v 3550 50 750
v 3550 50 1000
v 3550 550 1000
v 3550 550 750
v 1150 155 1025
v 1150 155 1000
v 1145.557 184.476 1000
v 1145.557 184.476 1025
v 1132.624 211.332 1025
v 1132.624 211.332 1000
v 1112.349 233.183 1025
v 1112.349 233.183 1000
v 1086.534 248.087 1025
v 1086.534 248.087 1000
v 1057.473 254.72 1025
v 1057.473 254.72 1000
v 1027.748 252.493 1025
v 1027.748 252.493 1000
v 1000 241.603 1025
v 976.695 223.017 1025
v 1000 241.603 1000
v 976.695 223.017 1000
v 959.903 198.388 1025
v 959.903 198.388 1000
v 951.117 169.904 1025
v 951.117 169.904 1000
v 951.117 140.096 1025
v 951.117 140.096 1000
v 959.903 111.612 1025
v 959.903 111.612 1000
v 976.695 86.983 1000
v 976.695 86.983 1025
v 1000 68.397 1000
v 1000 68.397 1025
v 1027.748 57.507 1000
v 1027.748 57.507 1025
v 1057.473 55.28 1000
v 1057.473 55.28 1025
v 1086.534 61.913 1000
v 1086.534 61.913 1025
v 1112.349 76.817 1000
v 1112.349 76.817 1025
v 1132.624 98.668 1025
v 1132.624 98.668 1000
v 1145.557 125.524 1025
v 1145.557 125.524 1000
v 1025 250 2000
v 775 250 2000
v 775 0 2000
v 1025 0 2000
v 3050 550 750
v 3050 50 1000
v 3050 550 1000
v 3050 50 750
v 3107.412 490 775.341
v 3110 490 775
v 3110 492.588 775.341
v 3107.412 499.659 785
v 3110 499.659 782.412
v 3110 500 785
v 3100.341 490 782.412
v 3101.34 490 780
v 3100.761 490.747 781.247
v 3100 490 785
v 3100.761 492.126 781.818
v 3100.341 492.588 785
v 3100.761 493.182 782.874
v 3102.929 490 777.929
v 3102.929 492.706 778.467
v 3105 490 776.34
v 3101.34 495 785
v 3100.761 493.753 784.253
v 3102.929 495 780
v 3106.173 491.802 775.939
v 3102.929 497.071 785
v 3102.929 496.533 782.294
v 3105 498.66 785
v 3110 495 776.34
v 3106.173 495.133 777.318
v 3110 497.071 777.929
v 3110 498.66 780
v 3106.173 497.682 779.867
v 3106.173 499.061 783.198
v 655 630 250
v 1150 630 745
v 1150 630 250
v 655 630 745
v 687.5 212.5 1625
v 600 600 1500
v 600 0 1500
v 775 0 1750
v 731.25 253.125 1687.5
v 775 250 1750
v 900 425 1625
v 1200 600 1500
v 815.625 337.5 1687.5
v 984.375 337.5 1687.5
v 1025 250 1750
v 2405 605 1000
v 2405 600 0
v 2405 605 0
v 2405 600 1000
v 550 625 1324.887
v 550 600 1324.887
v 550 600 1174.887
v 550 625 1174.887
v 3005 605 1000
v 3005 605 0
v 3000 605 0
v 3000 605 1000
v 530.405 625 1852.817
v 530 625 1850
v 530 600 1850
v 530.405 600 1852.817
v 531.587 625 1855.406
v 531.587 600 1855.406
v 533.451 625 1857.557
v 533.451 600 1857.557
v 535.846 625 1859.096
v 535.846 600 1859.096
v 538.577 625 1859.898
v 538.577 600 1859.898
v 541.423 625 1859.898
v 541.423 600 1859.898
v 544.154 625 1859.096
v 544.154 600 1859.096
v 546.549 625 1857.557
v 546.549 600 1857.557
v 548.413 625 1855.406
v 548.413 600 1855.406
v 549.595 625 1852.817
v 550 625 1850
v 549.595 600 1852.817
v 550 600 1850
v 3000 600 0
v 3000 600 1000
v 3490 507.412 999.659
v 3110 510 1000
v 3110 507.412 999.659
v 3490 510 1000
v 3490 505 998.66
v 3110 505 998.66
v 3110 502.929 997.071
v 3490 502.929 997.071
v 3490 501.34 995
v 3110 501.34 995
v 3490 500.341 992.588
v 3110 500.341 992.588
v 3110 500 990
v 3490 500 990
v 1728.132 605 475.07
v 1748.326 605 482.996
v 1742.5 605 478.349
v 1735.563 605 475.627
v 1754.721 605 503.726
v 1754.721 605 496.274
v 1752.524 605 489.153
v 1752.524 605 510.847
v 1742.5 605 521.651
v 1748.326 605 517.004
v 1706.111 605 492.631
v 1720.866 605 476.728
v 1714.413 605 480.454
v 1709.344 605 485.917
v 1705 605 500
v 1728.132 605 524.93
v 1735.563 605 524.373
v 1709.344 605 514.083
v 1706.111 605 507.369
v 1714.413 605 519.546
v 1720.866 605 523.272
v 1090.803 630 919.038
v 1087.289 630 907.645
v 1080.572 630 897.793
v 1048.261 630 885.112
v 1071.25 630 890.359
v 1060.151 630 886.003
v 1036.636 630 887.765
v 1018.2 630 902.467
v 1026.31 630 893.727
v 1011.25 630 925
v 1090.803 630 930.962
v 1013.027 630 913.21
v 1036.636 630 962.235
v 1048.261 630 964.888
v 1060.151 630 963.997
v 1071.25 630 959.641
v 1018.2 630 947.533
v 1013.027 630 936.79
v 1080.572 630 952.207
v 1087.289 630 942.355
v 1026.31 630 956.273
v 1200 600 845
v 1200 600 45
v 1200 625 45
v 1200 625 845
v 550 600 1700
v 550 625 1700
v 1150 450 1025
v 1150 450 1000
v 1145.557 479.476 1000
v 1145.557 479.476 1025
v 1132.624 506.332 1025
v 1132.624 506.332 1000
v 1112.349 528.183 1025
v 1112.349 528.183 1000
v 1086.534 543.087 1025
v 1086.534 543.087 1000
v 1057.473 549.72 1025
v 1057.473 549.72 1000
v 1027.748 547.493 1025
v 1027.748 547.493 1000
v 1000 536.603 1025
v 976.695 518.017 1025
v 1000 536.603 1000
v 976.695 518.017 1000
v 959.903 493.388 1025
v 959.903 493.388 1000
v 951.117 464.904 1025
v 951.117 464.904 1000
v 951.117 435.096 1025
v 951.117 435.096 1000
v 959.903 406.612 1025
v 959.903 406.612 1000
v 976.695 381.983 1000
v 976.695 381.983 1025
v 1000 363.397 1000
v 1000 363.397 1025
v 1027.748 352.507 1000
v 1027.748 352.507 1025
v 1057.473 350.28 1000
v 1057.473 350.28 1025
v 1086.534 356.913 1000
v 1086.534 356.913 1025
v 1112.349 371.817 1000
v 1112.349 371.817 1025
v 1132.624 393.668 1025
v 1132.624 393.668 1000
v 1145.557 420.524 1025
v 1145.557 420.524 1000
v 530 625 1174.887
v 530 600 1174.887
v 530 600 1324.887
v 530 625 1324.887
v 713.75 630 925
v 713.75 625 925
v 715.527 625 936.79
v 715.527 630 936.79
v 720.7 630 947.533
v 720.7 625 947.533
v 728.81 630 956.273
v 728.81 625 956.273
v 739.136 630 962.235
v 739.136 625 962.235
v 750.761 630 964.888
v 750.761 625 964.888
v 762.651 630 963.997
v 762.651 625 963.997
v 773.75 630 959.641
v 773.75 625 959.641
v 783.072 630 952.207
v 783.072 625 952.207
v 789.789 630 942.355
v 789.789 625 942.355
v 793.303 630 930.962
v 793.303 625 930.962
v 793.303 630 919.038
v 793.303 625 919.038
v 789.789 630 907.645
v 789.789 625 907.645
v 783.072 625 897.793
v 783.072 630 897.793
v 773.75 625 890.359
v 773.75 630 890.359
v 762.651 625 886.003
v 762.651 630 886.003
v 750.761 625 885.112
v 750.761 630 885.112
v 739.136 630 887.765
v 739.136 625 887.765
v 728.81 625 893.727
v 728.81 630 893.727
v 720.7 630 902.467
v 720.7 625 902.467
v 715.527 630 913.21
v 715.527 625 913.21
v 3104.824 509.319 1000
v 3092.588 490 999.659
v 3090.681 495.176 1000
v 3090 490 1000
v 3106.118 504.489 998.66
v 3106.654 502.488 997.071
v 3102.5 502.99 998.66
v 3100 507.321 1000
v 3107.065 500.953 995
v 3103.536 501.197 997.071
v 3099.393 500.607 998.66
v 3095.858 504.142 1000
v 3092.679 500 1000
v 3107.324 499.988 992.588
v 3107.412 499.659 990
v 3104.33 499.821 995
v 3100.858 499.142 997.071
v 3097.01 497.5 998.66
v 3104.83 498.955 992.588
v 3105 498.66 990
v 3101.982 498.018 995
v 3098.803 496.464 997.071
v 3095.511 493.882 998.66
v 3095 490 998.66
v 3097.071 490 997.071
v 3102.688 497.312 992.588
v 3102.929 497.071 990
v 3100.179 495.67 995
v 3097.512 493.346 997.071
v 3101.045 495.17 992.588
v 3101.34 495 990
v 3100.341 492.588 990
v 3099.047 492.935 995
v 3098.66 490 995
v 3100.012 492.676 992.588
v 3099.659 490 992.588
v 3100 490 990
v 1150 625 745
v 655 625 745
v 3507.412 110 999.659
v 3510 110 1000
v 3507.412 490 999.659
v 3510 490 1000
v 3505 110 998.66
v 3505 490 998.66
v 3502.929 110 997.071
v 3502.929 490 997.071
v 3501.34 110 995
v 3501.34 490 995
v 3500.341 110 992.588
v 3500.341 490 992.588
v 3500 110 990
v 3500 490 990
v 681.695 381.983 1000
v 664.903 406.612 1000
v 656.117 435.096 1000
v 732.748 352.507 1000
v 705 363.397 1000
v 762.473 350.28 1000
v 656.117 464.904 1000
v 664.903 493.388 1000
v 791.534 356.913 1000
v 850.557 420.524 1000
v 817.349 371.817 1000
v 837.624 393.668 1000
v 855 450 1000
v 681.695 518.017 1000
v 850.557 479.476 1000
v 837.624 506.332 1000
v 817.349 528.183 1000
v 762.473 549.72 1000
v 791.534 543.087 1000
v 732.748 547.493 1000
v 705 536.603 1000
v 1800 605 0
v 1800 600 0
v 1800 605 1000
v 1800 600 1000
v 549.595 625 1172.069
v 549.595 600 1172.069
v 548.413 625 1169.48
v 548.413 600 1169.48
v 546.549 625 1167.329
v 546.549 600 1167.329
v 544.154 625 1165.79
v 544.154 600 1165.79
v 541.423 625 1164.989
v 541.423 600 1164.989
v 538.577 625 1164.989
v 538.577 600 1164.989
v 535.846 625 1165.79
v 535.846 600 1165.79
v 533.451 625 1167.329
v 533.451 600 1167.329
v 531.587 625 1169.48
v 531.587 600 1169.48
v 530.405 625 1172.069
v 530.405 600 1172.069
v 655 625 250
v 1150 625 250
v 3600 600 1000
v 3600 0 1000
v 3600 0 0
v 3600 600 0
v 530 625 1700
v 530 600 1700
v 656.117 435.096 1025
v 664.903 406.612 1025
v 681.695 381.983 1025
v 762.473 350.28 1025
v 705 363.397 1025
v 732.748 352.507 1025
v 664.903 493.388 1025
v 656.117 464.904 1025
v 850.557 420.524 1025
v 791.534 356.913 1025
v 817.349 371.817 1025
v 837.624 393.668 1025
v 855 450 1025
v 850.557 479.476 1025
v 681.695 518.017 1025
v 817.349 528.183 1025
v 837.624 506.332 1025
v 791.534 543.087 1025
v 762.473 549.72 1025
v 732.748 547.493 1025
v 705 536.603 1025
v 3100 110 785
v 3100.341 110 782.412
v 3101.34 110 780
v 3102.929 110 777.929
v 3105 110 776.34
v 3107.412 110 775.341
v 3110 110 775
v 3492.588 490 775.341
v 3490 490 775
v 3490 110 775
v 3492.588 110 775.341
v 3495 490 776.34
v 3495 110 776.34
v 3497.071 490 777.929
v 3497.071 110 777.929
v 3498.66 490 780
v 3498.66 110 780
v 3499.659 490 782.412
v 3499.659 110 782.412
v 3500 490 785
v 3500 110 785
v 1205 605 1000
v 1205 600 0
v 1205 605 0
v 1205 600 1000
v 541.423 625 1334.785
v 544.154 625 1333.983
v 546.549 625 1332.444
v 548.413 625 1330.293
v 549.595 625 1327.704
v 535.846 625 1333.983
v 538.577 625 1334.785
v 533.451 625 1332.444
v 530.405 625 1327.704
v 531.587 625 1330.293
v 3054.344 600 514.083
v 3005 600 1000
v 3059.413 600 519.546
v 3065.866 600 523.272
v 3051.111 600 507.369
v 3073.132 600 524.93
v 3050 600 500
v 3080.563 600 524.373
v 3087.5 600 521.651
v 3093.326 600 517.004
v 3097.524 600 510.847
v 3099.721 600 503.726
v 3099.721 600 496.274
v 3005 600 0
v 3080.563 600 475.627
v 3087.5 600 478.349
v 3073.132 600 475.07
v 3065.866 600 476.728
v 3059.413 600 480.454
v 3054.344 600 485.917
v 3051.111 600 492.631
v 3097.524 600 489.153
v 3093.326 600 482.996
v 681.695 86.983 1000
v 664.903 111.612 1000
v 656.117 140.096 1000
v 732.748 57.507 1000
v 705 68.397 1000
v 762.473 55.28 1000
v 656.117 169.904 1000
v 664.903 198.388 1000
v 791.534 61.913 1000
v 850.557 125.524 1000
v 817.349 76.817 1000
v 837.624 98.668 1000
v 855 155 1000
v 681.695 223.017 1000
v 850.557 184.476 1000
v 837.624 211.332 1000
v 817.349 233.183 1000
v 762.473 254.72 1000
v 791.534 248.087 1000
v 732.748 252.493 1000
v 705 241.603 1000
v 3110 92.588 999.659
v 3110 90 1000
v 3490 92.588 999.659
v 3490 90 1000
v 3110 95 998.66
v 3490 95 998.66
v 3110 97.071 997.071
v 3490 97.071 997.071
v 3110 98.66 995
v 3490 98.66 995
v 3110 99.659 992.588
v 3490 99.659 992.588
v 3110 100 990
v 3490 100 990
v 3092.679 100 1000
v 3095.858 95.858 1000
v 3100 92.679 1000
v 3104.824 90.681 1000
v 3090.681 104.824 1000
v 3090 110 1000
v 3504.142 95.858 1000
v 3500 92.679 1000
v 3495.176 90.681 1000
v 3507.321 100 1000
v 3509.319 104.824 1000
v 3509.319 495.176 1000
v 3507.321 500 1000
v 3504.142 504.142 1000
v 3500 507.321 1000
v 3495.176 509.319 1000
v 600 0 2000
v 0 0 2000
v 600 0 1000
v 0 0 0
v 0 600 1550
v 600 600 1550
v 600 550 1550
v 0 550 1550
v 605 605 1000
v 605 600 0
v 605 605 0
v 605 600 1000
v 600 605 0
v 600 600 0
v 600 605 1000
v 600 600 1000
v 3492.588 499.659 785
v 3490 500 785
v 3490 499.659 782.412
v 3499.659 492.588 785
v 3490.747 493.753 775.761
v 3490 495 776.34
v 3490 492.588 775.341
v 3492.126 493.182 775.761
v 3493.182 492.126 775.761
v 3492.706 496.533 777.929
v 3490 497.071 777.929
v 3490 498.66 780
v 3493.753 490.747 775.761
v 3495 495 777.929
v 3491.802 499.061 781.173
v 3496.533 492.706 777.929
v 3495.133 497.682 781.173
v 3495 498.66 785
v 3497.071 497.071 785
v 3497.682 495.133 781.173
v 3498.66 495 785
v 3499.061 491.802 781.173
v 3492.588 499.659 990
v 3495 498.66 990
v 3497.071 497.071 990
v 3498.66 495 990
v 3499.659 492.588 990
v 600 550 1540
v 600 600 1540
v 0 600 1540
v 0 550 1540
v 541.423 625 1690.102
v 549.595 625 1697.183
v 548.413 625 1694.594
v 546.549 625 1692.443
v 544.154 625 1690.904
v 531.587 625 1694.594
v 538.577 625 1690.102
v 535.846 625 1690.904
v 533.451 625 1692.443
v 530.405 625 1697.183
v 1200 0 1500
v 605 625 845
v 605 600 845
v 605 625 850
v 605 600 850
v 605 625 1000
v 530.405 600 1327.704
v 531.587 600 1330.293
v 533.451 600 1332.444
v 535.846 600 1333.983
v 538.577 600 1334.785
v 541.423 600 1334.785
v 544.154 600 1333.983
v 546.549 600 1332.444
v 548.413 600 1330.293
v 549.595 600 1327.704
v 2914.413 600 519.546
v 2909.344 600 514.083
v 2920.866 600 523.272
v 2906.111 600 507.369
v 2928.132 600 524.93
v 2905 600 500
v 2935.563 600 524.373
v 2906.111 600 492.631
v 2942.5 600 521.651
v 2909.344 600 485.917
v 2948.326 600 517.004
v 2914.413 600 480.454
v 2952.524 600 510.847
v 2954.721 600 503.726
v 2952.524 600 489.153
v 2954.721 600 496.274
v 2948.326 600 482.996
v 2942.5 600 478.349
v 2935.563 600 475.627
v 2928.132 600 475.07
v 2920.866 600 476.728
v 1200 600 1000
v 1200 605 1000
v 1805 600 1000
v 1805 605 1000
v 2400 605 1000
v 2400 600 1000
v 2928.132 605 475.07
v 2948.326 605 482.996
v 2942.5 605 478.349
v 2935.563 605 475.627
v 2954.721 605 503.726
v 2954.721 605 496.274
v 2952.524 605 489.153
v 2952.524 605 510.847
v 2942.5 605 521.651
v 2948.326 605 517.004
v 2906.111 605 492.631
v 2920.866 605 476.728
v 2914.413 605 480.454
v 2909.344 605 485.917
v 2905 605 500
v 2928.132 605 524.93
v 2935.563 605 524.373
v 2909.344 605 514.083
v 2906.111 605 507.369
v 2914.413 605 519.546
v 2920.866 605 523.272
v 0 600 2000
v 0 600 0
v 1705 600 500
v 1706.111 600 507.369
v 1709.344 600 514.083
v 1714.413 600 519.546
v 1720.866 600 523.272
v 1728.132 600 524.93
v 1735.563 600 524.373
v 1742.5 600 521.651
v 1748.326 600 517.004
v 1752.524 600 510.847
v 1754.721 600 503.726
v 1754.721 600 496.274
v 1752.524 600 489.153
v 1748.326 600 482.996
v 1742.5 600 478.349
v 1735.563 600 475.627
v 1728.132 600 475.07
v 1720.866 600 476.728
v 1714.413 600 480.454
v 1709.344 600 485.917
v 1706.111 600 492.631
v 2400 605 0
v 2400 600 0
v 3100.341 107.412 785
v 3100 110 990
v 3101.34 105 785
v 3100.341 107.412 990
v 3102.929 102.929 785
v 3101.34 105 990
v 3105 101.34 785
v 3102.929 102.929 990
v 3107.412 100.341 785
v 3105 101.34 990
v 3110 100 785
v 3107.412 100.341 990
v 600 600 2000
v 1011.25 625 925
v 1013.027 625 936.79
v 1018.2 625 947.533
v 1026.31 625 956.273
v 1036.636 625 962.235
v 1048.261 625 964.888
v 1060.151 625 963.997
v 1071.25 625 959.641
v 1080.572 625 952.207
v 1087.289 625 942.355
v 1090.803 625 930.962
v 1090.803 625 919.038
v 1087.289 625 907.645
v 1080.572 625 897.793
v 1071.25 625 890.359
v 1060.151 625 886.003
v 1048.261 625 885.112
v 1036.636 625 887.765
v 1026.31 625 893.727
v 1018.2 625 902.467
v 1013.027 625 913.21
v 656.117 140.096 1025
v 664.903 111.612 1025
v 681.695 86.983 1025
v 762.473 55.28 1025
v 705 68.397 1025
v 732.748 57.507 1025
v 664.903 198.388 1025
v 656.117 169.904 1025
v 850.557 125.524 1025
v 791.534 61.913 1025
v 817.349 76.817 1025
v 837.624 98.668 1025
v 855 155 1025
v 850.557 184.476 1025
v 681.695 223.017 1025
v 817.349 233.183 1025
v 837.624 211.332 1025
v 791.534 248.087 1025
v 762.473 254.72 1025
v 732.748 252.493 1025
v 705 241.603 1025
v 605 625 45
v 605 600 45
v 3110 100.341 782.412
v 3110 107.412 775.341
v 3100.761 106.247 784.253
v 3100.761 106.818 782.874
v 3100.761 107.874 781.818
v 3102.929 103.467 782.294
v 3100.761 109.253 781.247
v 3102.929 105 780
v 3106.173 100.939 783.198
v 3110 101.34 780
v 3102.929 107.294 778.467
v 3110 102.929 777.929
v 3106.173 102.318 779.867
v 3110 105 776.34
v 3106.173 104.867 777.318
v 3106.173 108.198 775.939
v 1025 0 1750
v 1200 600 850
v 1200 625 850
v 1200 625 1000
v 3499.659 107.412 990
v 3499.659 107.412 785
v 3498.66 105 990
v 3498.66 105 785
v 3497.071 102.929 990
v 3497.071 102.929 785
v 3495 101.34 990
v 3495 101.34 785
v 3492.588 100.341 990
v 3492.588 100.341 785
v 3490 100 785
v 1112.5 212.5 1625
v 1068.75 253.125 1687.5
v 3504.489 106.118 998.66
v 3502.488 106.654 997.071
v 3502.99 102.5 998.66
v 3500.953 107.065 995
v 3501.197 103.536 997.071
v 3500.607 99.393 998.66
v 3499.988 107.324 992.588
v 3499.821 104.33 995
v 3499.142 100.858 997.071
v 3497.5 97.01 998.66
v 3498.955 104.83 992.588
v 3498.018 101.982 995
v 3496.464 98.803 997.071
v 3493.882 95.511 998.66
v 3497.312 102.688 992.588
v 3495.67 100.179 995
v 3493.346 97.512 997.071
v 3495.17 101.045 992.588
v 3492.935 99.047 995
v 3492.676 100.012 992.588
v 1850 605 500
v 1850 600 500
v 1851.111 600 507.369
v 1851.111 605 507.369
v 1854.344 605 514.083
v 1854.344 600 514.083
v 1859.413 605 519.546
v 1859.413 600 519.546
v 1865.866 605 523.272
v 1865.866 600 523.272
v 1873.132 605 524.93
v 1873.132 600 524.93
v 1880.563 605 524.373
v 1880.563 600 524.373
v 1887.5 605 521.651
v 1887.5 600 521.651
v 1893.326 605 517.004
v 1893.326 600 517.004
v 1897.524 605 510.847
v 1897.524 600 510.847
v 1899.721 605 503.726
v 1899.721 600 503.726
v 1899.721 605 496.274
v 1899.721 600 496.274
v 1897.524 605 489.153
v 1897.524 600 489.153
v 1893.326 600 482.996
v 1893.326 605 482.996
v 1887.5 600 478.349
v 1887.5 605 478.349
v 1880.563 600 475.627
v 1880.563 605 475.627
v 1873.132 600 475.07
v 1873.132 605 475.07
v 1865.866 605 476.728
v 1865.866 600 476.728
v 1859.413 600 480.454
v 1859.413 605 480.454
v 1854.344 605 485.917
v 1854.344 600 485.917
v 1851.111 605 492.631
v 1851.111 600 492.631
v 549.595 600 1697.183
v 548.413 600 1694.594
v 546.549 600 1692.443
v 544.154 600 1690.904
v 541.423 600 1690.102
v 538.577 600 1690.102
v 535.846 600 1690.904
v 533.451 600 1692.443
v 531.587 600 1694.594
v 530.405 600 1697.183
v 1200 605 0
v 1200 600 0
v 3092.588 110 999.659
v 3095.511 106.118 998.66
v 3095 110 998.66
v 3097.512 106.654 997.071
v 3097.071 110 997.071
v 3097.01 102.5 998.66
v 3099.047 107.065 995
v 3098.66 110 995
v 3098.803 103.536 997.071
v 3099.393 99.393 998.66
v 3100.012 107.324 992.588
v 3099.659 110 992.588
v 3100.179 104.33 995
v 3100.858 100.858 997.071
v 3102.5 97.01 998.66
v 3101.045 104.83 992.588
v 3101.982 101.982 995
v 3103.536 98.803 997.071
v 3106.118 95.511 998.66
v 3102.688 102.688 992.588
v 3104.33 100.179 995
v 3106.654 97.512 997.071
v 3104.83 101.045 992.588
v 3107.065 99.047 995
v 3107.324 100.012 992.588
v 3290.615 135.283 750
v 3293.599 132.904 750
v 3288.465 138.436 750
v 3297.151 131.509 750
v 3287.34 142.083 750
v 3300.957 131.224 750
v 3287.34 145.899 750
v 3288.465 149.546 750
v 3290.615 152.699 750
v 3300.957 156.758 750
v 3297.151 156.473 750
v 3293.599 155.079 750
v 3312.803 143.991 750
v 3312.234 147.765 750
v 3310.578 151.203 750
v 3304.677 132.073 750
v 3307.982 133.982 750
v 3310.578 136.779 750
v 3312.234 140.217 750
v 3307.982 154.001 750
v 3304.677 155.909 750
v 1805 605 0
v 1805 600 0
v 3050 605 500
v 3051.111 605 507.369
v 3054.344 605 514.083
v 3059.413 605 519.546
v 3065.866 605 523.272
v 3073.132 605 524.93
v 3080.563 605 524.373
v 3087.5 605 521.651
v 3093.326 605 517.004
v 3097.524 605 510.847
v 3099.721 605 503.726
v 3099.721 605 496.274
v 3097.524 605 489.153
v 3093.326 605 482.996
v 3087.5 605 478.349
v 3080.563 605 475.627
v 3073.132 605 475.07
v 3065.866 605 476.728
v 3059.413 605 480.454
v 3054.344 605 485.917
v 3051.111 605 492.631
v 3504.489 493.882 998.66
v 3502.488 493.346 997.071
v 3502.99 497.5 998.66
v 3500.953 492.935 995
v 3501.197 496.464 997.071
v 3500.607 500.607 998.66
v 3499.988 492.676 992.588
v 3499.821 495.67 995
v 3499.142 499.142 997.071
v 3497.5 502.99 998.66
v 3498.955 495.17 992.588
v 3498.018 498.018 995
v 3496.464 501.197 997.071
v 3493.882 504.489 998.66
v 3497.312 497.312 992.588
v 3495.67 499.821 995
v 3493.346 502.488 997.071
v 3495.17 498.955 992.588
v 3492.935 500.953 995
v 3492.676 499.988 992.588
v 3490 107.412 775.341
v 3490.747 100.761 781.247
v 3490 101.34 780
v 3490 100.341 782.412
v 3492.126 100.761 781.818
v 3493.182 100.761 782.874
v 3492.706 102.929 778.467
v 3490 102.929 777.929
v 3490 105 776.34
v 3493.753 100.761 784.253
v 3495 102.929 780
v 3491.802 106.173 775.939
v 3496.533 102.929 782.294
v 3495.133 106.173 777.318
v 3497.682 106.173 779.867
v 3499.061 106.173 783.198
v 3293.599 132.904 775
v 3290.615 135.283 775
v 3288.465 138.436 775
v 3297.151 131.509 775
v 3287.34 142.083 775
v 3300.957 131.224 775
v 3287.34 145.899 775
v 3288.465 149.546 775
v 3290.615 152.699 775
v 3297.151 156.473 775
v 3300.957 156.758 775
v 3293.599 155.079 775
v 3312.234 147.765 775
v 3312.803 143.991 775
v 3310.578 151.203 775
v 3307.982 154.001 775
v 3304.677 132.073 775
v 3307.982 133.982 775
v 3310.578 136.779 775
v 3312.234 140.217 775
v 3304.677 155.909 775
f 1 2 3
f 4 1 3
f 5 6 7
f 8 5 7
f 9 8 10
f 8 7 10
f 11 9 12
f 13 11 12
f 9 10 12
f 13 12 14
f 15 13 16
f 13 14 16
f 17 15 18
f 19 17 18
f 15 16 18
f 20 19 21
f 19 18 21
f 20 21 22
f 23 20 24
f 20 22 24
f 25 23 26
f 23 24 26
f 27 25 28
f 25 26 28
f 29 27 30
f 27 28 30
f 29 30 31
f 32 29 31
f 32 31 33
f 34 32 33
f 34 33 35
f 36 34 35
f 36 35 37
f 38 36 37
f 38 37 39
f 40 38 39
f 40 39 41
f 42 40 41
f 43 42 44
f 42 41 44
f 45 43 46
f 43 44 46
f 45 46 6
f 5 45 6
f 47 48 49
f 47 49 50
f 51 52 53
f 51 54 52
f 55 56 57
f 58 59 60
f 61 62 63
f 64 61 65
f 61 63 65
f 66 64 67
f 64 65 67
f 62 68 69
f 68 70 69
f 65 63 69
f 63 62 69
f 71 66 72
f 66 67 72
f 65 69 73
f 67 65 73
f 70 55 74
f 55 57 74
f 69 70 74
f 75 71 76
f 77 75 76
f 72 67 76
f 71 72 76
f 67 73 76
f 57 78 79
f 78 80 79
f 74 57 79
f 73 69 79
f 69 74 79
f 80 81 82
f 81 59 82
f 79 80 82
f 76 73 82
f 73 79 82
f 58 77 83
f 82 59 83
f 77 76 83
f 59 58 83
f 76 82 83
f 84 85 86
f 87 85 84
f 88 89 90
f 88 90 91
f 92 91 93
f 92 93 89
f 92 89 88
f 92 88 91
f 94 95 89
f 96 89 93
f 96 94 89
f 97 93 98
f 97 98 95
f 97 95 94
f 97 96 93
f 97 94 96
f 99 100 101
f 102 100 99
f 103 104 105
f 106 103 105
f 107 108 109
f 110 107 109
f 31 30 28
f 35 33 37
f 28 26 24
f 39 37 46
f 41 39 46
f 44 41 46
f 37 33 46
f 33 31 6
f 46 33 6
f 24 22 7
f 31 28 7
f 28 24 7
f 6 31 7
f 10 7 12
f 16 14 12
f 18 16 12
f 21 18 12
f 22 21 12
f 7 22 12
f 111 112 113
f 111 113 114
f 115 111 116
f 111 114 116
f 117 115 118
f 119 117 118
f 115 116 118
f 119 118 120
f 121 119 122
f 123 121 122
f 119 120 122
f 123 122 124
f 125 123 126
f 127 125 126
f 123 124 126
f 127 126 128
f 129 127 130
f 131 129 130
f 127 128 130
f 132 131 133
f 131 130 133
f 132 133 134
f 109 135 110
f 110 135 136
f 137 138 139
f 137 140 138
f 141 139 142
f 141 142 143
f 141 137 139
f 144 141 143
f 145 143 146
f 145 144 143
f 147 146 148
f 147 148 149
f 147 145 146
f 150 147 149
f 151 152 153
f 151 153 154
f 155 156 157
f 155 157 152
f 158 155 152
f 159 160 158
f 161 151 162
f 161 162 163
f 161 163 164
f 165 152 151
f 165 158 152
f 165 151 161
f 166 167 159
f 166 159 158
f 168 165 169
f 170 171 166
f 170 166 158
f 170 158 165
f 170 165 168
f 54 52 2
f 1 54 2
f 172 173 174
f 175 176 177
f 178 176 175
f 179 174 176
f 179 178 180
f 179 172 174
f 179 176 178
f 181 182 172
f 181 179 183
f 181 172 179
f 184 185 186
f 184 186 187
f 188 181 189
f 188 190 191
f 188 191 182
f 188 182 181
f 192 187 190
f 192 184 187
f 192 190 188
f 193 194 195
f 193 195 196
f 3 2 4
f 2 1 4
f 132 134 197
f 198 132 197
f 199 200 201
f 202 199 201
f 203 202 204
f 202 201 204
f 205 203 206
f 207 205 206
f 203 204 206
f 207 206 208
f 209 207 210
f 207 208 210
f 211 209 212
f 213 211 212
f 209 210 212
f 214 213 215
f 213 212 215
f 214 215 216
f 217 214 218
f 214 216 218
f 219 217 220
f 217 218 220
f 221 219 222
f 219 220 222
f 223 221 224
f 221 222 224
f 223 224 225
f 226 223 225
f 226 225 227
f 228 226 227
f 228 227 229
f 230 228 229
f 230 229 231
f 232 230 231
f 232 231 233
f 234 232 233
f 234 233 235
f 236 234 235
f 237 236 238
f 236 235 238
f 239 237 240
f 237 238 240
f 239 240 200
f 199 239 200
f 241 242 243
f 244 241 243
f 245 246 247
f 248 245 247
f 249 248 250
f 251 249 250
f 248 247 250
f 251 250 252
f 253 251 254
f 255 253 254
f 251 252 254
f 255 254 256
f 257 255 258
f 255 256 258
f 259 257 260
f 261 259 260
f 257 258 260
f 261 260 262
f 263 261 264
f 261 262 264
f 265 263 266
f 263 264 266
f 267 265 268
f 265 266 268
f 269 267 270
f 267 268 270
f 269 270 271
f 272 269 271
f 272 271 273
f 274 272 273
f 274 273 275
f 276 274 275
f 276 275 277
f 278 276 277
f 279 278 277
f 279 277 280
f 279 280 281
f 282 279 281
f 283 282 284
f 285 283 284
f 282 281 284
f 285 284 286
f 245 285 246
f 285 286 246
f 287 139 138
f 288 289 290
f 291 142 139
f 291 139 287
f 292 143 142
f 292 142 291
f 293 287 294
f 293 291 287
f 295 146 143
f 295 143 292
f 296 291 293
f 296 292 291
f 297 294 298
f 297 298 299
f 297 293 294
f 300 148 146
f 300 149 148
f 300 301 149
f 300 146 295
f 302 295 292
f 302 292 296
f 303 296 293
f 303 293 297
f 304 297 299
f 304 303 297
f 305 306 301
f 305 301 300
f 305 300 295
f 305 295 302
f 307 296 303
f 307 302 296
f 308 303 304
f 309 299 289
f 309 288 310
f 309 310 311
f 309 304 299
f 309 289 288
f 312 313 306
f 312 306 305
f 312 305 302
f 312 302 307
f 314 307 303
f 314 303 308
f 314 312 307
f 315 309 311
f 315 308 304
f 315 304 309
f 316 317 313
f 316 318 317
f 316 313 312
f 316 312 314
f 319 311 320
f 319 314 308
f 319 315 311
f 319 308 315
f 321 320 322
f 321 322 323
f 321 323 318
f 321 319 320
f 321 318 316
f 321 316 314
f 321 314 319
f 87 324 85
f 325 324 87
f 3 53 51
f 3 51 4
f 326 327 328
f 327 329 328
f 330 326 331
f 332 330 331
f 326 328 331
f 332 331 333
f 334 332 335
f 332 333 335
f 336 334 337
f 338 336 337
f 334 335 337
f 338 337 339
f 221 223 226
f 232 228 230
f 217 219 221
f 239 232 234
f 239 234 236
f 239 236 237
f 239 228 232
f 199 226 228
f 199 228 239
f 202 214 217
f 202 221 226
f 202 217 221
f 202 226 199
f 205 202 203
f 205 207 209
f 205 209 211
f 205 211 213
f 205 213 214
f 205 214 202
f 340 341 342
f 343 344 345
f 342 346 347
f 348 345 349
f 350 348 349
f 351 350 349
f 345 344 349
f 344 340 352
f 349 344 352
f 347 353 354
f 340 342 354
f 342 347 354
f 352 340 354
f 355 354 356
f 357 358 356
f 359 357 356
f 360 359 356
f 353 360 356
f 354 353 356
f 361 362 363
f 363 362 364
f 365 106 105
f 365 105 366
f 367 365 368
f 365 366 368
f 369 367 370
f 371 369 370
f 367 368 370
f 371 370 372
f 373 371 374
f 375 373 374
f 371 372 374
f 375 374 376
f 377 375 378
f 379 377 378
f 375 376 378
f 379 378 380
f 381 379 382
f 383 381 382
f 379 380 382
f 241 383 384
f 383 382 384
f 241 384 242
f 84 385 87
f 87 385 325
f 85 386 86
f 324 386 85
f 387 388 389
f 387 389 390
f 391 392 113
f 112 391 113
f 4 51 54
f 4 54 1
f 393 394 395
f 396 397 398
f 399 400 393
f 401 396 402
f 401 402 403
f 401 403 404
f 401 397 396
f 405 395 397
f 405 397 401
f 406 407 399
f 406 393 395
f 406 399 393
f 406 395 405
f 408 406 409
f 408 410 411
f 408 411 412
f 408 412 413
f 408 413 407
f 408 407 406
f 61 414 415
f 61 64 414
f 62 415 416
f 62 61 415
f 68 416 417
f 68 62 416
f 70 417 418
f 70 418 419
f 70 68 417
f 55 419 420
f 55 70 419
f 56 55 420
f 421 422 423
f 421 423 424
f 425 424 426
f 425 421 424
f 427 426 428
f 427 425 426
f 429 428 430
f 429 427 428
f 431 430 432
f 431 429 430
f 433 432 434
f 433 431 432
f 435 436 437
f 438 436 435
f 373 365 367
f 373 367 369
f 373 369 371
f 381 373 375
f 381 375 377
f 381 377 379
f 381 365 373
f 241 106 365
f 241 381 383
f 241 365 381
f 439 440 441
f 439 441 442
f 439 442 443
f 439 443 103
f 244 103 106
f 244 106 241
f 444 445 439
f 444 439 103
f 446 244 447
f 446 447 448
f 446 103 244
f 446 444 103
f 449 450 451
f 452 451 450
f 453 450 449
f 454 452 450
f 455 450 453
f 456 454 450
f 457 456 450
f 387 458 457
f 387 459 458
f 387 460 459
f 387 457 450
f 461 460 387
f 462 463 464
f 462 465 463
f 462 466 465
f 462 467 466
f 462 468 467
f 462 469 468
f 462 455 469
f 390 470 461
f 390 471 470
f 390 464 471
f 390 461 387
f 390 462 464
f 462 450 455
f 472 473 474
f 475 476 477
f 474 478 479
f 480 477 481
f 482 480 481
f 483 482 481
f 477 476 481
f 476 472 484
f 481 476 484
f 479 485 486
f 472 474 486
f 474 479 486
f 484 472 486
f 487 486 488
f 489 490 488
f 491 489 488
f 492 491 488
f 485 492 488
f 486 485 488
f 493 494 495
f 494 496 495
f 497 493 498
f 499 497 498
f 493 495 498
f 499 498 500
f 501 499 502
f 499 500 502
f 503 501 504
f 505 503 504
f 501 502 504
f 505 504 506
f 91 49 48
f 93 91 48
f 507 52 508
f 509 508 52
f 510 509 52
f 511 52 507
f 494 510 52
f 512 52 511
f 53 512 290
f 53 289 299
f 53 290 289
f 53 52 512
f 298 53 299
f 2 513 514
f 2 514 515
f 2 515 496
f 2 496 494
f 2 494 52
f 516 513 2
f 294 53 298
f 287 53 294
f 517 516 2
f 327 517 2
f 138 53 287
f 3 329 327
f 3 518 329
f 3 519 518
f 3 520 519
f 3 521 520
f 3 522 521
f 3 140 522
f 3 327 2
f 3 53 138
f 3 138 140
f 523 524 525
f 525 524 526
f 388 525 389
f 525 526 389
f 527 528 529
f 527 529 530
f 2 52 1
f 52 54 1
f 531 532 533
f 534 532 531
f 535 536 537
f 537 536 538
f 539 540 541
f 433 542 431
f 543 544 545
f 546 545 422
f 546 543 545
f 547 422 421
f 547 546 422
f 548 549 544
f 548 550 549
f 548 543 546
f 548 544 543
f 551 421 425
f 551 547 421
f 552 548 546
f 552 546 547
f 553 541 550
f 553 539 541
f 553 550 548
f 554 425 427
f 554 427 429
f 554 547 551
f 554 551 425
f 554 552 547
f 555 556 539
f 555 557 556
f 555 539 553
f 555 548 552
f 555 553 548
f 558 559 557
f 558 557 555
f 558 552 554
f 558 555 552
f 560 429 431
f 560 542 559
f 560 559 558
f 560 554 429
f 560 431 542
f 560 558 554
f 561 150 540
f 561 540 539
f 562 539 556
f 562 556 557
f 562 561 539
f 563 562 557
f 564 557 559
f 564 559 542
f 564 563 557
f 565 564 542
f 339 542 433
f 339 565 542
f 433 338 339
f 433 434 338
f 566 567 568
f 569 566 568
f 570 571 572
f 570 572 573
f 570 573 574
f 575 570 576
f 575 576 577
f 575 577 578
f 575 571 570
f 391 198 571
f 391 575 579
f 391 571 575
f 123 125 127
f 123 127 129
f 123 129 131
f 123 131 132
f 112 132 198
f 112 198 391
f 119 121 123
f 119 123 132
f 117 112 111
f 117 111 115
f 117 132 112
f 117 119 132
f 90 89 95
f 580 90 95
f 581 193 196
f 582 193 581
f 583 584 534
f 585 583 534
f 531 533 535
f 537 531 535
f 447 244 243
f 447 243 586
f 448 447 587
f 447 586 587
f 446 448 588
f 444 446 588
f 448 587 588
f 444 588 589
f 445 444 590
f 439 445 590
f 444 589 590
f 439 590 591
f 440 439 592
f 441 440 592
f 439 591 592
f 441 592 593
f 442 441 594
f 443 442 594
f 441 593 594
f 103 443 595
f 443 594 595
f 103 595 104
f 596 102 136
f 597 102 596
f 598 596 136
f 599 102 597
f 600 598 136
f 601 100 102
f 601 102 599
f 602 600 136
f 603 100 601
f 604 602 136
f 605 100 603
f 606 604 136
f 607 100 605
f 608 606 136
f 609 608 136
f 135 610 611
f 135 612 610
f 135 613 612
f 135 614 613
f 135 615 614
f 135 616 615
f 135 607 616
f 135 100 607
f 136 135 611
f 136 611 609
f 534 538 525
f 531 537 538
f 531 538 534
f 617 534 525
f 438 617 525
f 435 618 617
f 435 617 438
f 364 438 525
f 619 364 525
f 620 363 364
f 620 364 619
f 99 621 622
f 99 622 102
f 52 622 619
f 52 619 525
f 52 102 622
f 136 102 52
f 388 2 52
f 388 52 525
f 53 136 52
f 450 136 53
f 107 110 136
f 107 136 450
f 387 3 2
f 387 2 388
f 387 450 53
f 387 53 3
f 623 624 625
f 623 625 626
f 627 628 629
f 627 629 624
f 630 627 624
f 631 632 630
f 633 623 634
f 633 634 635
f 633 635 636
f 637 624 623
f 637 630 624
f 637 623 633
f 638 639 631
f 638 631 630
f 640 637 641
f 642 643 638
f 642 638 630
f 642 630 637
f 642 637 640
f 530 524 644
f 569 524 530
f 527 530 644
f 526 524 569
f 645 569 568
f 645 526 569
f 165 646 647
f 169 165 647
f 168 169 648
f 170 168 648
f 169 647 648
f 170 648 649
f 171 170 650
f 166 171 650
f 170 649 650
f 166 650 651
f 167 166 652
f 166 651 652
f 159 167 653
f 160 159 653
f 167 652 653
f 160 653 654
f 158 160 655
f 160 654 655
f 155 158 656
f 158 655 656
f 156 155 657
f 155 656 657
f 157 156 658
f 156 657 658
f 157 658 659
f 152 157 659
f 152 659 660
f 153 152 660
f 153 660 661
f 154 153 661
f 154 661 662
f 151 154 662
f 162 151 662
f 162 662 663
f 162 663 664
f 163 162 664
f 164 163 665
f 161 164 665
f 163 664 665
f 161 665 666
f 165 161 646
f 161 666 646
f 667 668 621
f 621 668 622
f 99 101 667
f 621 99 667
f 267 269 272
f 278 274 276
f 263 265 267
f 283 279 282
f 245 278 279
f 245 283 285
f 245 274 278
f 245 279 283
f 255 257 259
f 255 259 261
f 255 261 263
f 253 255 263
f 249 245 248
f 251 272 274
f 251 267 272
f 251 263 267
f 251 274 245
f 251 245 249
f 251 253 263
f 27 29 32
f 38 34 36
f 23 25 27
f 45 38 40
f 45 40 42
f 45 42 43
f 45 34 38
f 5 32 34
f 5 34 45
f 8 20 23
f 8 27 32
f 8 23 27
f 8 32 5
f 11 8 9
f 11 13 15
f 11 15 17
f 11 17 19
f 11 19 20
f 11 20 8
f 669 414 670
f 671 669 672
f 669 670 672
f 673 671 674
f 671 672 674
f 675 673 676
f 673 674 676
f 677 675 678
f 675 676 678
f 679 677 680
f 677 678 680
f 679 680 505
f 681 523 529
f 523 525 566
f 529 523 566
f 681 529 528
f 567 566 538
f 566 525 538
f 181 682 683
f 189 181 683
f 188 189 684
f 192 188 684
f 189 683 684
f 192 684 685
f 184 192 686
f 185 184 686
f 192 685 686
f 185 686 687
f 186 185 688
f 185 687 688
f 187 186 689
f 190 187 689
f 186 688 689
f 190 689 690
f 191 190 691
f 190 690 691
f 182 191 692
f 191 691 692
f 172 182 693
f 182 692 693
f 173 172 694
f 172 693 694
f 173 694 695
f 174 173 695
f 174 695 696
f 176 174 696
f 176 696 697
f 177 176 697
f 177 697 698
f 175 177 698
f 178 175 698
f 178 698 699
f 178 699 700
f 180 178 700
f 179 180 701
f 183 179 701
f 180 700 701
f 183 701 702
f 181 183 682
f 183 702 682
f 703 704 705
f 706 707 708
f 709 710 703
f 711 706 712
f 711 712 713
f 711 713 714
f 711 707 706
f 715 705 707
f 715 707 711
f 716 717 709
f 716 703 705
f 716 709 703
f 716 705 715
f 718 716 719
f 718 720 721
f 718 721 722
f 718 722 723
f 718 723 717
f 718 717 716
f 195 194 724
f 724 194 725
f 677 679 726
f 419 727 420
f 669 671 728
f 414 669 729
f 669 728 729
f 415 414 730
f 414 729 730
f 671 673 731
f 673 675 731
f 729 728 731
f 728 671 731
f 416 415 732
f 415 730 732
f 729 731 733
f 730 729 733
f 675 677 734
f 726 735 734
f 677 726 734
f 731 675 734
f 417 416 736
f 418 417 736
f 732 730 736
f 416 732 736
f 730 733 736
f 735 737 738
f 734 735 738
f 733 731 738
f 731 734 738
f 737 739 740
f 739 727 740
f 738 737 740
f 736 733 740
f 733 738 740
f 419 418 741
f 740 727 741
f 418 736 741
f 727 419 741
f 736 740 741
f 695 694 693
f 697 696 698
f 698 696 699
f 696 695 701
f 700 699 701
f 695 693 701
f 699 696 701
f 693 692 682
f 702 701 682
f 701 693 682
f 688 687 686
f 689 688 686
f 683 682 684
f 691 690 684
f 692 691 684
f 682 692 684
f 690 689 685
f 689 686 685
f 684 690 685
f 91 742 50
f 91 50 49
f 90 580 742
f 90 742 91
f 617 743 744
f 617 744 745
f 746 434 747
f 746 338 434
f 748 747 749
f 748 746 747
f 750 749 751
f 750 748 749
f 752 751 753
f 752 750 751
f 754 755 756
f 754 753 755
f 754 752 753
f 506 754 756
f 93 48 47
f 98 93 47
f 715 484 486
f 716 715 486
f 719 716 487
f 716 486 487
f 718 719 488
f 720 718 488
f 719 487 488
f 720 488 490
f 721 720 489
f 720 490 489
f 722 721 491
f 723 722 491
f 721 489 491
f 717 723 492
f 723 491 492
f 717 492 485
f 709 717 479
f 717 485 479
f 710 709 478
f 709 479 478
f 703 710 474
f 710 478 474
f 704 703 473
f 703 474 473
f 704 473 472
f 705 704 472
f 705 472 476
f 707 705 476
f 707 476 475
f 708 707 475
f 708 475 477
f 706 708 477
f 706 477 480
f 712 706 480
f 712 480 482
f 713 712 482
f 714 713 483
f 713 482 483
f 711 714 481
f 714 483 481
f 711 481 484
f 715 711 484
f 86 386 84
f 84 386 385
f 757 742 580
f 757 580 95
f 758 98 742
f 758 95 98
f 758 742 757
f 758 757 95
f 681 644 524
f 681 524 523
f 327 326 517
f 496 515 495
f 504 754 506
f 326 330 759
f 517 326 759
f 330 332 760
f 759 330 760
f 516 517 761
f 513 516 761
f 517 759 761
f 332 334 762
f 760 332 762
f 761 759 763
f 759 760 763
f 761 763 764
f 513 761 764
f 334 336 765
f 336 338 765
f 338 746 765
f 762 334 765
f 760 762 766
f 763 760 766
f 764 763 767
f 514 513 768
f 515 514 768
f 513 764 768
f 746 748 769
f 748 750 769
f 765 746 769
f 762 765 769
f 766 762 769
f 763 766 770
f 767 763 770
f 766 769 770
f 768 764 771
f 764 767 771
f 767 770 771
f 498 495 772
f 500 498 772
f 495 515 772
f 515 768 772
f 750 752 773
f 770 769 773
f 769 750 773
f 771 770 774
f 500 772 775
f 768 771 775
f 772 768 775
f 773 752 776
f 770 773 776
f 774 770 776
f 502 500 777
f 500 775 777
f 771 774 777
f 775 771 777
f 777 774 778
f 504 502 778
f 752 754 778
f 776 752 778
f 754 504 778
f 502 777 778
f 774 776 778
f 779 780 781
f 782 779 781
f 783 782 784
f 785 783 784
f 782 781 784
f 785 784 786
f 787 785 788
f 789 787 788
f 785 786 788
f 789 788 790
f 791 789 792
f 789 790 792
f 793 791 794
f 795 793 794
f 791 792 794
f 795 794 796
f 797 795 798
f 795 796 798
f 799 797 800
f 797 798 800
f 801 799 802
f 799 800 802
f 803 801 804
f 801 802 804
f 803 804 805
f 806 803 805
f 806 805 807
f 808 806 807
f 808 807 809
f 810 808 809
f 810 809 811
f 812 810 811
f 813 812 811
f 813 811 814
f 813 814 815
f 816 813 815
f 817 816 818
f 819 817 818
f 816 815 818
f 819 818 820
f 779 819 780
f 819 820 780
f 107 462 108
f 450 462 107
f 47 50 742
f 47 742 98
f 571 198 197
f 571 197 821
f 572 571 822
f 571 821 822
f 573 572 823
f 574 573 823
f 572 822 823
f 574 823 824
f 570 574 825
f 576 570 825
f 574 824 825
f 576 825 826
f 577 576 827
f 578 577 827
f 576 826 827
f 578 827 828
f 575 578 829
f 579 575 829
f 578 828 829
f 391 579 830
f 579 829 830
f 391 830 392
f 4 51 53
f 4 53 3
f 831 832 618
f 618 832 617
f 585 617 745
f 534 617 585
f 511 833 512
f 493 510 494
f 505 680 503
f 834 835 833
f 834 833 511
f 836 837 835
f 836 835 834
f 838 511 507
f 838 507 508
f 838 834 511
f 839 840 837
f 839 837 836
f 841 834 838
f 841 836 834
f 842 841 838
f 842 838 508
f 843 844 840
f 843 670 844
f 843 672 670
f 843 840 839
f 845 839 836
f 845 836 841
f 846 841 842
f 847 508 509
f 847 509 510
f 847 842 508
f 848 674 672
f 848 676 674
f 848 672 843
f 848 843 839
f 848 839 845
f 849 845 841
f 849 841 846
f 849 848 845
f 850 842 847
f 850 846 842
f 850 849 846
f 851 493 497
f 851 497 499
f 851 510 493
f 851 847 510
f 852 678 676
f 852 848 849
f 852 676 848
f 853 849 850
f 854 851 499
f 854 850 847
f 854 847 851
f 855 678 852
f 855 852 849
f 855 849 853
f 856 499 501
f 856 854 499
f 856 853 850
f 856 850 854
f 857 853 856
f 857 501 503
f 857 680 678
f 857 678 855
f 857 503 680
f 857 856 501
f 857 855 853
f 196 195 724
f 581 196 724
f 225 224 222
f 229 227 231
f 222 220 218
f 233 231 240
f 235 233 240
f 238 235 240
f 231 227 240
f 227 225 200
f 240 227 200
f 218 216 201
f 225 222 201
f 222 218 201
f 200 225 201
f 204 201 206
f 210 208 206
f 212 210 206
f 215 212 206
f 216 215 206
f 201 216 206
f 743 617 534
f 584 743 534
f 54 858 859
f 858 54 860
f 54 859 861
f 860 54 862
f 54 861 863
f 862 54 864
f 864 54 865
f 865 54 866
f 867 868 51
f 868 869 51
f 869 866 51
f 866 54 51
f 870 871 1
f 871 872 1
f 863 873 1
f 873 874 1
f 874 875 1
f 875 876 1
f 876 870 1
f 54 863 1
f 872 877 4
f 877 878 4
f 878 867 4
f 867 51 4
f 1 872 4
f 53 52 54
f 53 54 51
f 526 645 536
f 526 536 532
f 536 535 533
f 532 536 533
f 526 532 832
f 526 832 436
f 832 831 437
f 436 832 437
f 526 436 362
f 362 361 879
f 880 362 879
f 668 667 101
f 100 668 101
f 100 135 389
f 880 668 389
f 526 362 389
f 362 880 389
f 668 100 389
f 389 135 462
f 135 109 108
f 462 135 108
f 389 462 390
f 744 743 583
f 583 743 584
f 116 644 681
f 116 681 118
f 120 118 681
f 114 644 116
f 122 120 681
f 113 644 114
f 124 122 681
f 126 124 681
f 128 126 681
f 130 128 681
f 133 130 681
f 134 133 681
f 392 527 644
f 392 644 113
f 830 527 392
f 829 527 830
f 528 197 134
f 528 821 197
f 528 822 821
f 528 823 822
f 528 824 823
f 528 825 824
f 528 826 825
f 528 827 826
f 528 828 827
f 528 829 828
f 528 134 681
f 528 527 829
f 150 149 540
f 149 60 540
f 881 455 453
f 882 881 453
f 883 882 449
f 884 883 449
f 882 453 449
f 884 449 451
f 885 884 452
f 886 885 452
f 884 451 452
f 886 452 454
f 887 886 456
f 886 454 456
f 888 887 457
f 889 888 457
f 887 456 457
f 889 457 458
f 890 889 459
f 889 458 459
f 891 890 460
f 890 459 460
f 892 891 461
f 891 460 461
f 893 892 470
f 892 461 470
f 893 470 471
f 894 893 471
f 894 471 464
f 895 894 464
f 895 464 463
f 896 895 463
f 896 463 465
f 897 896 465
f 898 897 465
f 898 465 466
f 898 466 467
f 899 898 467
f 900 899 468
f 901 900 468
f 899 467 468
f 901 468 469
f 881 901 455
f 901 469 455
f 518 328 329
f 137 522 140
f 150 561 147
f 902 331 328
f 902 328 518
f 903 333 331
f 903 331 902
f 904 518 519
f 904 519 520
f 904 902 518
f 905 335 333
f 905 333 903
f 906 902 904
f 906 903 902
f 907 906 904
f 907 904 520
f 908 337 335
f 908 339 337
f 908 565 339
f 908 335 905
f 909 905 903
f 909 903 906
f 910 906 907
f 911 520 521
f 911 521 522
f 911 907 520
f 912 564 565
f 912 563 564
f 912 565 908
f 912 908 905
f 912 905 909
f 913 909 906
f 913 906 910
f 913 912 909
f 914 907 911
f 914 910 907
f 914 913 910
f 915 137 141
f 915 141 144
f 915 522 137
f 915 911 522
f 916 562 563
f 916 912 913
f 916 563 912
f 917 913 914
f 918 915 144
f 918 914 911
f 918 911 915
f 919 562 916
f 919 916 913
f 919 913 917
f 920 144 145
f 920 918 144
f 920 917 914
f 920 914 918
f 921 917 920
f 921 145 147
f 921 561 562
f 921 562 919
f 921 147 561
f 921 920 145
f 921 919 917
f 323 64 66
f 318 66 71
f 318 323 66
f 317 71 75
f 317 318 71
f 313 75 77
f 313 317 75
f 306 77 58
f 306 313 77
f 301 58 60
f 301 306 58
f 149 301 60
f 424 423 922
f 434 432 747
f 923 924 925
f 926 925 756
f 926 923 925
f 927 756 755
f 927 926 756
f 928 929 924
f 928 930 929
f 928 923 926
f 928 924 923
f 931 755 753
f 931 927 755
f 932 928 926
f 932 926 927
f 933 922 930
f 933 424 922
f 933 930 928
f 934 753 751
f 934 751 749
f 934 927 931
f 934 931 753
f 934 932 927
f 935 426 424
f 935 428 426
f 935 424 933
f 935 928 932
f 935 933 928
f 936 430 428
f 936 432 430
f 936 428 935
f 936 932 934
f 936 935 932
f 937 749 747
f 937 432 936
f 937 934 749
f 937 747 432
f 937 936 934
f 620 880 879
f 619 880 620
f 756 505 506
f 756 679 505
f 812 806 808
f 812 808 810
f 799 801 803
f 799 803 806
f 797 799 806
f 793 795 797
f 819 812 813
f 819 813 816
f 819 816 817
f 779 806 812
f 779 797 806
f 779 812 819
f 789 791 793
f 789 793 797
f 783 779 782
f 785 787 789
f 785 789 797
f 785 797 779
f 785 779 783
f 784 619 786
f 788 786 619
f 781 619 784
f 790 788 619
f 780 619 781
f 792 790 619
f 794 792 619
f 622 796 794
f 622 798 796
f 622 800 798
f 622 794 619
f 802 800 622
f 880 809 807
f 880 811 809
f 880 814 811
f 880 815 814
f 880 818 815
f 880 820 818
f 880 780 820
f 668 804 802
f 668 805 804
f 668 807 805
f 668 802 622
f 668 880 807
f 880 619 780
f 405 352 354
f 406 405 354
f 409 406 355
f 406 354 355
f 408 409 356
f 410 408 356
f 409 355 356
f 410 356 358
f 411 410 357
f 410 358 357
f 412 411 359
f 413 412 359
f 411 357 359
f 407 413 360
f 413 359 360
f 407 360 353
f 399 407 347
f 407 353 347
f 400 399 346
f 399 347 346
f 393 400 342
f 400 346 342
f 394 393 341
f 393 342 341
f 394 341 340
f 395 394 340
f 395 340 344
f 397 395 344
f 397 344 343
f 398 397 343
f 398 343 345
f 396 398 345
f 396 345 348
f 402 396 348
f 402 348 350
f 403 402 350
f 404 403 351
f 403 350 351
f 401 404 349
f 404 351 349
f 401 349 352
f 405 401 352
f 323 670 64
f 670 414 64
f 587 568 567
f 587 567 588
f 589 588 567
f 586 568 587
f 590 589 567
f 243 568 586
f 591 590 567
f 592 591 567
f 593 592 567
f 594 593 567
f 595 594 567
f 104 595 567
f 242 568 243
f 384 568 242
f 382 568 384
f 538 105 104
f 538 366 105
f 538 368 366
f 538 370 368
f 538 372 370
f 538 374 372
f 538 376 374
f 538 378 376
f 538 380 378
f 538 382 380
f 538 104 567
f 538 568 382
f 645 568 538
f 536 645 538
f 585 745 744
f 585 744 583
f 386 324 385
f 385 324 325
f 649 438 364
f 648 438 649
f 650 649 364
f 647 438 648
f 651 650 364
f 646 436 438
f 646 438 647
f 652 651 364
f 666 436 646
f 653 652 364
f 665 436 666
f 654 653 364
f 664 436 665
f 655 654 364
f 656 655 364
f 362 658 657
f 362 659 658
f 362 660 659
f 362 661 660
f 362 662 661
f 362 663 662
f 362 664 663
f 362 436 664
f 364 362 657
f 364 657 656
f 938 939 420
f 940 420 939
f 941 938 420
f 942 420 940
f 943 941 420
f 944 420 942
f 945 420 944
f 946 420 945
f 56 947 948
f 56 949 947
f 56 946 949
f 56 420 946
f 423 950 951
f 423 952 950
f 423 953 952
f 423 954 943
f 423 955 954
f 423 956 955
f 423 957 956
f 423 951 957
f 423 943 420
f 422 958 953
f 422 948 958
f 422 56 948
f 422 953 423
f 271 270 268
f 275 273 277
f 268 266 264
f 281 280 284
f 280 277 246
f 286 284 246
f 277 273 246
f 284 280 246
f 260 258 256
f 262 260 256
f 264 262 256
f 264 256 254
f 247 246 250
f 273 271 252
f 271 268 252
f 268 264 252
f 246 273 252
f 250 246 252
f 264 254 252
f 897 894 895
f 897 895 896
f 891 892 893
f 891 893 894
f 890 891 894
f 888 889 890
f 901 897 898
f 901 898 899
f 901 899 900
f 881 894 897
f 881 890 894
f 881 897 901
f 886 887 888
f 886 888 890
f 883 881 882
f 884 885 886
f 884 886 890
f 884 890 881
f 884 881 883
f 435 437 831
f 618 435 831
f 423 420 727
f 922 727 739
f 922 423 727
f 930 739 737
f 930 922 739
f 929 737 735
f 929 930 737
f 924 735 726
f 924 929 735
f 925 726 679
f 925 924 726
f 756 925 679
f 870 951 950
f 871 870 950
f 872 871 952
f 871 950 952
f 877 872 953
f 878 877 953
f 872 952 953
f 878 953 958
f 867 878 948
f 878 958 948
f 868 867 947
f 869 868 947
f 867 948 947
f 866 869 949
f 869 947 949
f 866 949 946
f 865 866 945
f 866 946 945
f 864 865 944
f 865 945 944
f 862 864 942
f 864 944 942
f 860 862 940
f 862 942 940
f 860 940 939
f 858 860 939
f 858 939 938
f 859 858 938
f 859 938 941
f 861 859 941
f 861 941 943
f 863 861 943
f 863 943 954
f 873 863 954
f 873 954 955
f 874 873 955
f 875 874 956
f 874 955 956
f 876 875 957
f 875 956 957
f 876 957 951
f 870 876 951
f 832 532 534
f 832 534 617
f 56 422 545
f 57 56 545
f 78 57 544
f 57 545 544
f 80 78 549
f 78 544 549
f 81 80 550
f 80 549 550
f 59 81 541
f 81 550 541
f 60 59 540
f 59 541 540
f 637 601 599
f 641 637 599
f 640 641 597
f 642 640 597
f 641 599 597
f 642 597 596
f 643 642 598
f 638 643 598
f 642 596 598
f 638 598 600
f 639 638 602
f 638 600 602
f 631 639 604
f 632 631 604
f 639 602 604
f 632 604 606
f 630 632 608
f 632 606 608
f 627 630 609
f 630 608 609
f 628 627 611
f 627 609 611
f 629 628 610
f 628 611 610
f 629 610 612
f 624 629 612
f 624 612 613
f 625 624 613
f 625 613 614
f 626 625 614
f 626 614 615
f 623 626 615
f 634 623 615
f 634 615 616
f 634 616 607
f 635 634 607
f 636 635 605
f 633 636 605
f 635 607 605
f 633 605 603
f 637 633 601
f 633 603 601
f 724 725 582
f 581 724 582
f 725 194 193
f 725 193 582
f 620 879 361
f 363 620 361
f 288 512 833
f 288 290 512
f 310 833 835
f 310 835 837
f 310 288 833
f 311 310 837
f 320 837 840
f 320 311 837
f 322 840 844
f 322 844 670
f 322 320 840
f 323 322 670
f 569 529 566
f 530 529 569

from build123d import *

# Parameters (mm, degrees)
F0_W       = 3600
F0_H       = 600
F1_DEPTH   = 1000
F2_W       = 500
F2_H       = 500
F3_DEPTH   = 250
F4_W       = 500
F4_H       = 500
F5_DEPTH   = 25
F6_W       = 500
F6_H       = 500
F6_W_2     = 400
F6_H_2     = 400
F7_DEPTH   = 225
F8_R       = 10
F9_R       = 12.8028507665
F10_DEPTH  = 25
F11_W      = 5
F11_H      = 1000
F11_R      = 25
F12_DEPTH  = 5
F13_R      = 100
F14_DEPTH  = 25
F15_W      = 595
F15_H      = 150
F16_DEPTH  = 25
F15_H_2    = 800
F17_W      = 495
F17_H      = 495
F18_DEPTH  = 5
F17_R      = 40
F19_W      = 600
F19_H      = 600
F20_DEPTH  = 1000
F21_W      = 600
F21_H      = 10
F22_DEPTH  = 50
F24_DEPTH  = 25
F25_W      = 250
F25_H      = 250
F26_DEPTH  = 250
F26_FACE_W = 250
F26_FACE_H = 250
F28_W      = 600
F28_H      = 600


with BuildPart() as f1:
    # F0 (on Top) → F1 (new body)
    with BuildSketch(Plane.XY):
        with Locations((1800, 300)):
            Rectangle(F0_W, F0_H)
    extrude(amount=F1_DEPTH)

    # F2 (on face) → F3 (cut)
    with BuildSketch(Plane.XY.offset(1000)):
        with Locations((3300, 300)):
            Rectangle(F2_W, F2_H)
    extrude(amount=-F3_DEPTH, mode=Mode.SUBTRACT)

    # F11 (on face) → F12 (join)
    with BuildSketch(Plane(origin=(0, 600, 0), x_dir=(-1, 0, 0), z_dir=(0, 1, 0))):
        with Locations((-3002.5, 500)):
            Rectangle(F11_W, F11_H)
        with Locations((-2402.5, 500)):
            Rectangle(F11_W, F11_H)
        with Locations((-1802.5, 500)):
            Rectangle(F11_W, F11_H)
        with Locations((-1202.5, 500)):
            Rectangle(F11_W, F11_H)
        with Locations((-602.5, 500)):
            Rectangle(F11_W, F11_H)
        with Locations((-3075, 500)):
            Circle(F11_R)
        with Locations((-2930, 500)):
            Circle(F11_R)
        with Locations((-1730, 500)):
            Circle(F11_R)
        with Locations((-1875, 500)):
            Circle(F11_R)
    extrude(amount=F12_DEPTH)

    # F19 (on face) → F20 (join)
    with BuildSketch(Plane.XY.offset(1000)):
        with Locations((300, 300)):
            Rectangle(F19_W, F19_H)
    extrude(amount=F20_DEPTH)

    # F21 (on face) → F22 (cut)
    with BuildSketch(Plane(origin=(0, 600, 0), x_dir=(-1, 0, 0), z_dir=(0, 1, 0))):
        with Locations((-300, 1545)):
            Rectangle(F21_W, F21_H)
    extrude(amount=-F22_DEPTH, mode=Mode.SUBTRACT)

    # F23 (on face) → F24 (join)
    with BuildSketch(Plane(origin=(0, 600, 0), x_dir=(-1, 0, 0), z_dir=(0, 1, 0))):
        with BuildLine():
            Line((-550, 1850), (-550, 1775))
            Line((-550, 1775), (-550, 1700))
            ThreePointArc((-550, 1700), (-540, 1690), (-530, 1700))
            Line((-530, 1700), (-530, 1775))
            Line((-530, 1775), (-530, 1850))
            ThreePointArc((-530, 1850), (-540, 1860), (-550, 1850))
        make_face()
        with BuildLine():
            Line((-550, 1324.8867511749), (-550, 1249.8867511749))
            Line((-550, 1249.8867511749), (-550, 1174.8867511749))
            ThreePointArc((-550, 1174.8867511749), (-540, 1164.8867511749), (-530, 1174.8867511749))
            Line((-530, 1174.8867511749), (-530, 1249.8867511749))
            Line((-530, 1249.8867511749), (-530, 1324.8867511749))
            ThreePointArc((-530, 1324.8867511749), (-540, 1334.8867511749), (-550, 1324.8867511749))
        make_face()
    extrude(amount=F24_DEPTH)


with BuildPart() as f5:
    # F4 (on face) → F5 (new body)
    with BuildSketch(Plane.XY.offset(750)):
        with Locations((3300, 300)):
            Rectangle(F4_W, F4_H)
    extrude(amount=F5_DEPTH)

    # F6 (on face) → F7 (join, through all)
    with BuildSketch(Plane.XY.offset(775)):
        with Locations((3300, 300)):
            Rectangle(F6_W, F6_H)
        with Locations((3300, 300)):
            Rectangle(F6_W_2, F6_H_2, mode=Mode.SUBTRACT)
    extrude(amount=F7_DEPTH)

    # F8
    f8_edges = [f5.edges().sort_by_distance(p)[0] for p in [
        (3500, 300, 1000),
        (3300, 500, 1000),
        (3100, 300, 1000),
        (3300, 100, 1000),
        (3500, 500, 887.5),
        (3300, 500, 775),
        (3500, 300, 775),
        (3300, 100, 775),
        (3500, 100, 887.5),
        (3100, 100, 887.5),
        (3100, 300, 775),
        (3100, 500, 887.5),
    ]]
    fillet(f8_edges, radius=F8_R)

    # F9 (on face) → F10 (cut)
    with BuildSketch(Plane.XY.offset(775)):
        with Locations((3300, 143.9911872149)):
            Circle(F9_R)
    extrude(amount=-F10_DEPTH, mode=Mode.SUBTRACT)


with BuildPart() as f14:
    # F13 (on face) → F14 (new body)
    with BuildSketch(Plane.XY.offset(1000)):
        with Locations((1050, 155)):
            Circle(F13_R)
    extrude(amount=F14_DEPTH)


with BuildPart() as f14b:
    # F13 (on face) → F14, piece 2 (new body)
    with BuildSketch(Plane.XY.offset(1000)):
        with Locations((755, 155)):
            Circle(F13_R)
    extrude(amount=F14_DEPTH)


with BuildPart() as f14c:
    # F13 (on face) → F14, piece 3 (new body)
    with BuildSketch(Plane.XY.offset(1000)):
        with Locations((755, 450)):
            Circle(F13_R)
    extrude(amount=F14_DEPTH)


with BuildPart() as f14d:
    # F13 (on face) → F14, piece 4 (new body)
    with BuildSketch(Plane.XY.offset(1000)):
        with Locations((1050, 450)):
            Circle(F13_R)
    extrude(amount=F14_DEPTH)


with BuildPart() as f16:
    # F15 (on face) → F16 (new body)
    with BuildSketch(Plane(origin=(0, 600, 0), x_dir=(-1, 0, 0), z_dir=(0, 1, 0))):
        with Locations((-902.5, 925)):
            Rectangle(F15_W, F15_H)
    extrude(amount=F16_DEPTH)


with BuildPart() as f16b:
    # F15 (on face) → F16, piece 2 (new body)
    with BuildSketch(Plane(origin=(0, 600, 0), x_dir=(-1, 0, 0), z_dir=(0, 1, 0))):
        with Locations((-902.5, 445)):
            Rectangle(F15_W, F15_H_2)
    extrude(amount=F16_DEPTH)


with BuildPart() as f18:
    # F17 (on face) → F18 (new body)
    with BuildSketch(Plane(origin=(0, 625, 0), x_dir=(-1, 0, 0), z_dir=(0, 1, 0))):
        with Locations((-902.5, 497.5)):
            Rectangle(F17_W, F17_H)
    extrude(amount=F18_DEPTH)


with BuildPart() as f18b:
    # F17 (on face) → F18, piece 2 (new body)
    with BuildSketch(Plane(origin=(0, 625, 0), x_dir=(-1, 0, 0), z_dir=(0, 1, 0))):
        with Locations((-753.75, 925)):
            Circle(F17_R)
    extrude(amount=F18_DEPTH)


with BuildPart() as f18c:
    # F17 (on face) → F18, piece 3 (new body)
    with BuildSketch(Plane(origin=(0, 625, 0), x_dir=(-1, 0, 0), z_dir=(0, 1, 0))):
        with Locations((-1051.25, 925)):
            Circle(F17_R)
    extrude(amount=F18_DEPTH)


with BuildPart() as f26:
    # F25 (on face) → F26 (new body)
    with BuildSketch(Plane.XY.offset(2000)):
        with Locations((900, 125)):
            Rectangle(F25_W, F25_H)
    extrude(amount=-F26_DEPTH)

    # F26_face (on face) → F29 section 0
    with BuildSketch(Plane(origin=(900, 125, 1750), x_dir=(1, 0, 0), z_dir=(0, 0, -1))):
        Rectangle(F26_FACE_W, F26_FACE_H)
    # F28 (on offset) → F29 section 1
    with BuildSketch(Plane(origin=(0, 0, 1500), x_dir=(1, 0, 0), z_dir=(0, 0, -1))):
        with Locations((900, -300)):
            Rectangle(F28_W, F28_H)
    loft()


solid = Compound([f1.part, f5.part, f14.part, f14b.part, f14c.part, f14d.part, f16.part, f16b.part, f18.part, f18b.part, f18c.part, f26.part])
